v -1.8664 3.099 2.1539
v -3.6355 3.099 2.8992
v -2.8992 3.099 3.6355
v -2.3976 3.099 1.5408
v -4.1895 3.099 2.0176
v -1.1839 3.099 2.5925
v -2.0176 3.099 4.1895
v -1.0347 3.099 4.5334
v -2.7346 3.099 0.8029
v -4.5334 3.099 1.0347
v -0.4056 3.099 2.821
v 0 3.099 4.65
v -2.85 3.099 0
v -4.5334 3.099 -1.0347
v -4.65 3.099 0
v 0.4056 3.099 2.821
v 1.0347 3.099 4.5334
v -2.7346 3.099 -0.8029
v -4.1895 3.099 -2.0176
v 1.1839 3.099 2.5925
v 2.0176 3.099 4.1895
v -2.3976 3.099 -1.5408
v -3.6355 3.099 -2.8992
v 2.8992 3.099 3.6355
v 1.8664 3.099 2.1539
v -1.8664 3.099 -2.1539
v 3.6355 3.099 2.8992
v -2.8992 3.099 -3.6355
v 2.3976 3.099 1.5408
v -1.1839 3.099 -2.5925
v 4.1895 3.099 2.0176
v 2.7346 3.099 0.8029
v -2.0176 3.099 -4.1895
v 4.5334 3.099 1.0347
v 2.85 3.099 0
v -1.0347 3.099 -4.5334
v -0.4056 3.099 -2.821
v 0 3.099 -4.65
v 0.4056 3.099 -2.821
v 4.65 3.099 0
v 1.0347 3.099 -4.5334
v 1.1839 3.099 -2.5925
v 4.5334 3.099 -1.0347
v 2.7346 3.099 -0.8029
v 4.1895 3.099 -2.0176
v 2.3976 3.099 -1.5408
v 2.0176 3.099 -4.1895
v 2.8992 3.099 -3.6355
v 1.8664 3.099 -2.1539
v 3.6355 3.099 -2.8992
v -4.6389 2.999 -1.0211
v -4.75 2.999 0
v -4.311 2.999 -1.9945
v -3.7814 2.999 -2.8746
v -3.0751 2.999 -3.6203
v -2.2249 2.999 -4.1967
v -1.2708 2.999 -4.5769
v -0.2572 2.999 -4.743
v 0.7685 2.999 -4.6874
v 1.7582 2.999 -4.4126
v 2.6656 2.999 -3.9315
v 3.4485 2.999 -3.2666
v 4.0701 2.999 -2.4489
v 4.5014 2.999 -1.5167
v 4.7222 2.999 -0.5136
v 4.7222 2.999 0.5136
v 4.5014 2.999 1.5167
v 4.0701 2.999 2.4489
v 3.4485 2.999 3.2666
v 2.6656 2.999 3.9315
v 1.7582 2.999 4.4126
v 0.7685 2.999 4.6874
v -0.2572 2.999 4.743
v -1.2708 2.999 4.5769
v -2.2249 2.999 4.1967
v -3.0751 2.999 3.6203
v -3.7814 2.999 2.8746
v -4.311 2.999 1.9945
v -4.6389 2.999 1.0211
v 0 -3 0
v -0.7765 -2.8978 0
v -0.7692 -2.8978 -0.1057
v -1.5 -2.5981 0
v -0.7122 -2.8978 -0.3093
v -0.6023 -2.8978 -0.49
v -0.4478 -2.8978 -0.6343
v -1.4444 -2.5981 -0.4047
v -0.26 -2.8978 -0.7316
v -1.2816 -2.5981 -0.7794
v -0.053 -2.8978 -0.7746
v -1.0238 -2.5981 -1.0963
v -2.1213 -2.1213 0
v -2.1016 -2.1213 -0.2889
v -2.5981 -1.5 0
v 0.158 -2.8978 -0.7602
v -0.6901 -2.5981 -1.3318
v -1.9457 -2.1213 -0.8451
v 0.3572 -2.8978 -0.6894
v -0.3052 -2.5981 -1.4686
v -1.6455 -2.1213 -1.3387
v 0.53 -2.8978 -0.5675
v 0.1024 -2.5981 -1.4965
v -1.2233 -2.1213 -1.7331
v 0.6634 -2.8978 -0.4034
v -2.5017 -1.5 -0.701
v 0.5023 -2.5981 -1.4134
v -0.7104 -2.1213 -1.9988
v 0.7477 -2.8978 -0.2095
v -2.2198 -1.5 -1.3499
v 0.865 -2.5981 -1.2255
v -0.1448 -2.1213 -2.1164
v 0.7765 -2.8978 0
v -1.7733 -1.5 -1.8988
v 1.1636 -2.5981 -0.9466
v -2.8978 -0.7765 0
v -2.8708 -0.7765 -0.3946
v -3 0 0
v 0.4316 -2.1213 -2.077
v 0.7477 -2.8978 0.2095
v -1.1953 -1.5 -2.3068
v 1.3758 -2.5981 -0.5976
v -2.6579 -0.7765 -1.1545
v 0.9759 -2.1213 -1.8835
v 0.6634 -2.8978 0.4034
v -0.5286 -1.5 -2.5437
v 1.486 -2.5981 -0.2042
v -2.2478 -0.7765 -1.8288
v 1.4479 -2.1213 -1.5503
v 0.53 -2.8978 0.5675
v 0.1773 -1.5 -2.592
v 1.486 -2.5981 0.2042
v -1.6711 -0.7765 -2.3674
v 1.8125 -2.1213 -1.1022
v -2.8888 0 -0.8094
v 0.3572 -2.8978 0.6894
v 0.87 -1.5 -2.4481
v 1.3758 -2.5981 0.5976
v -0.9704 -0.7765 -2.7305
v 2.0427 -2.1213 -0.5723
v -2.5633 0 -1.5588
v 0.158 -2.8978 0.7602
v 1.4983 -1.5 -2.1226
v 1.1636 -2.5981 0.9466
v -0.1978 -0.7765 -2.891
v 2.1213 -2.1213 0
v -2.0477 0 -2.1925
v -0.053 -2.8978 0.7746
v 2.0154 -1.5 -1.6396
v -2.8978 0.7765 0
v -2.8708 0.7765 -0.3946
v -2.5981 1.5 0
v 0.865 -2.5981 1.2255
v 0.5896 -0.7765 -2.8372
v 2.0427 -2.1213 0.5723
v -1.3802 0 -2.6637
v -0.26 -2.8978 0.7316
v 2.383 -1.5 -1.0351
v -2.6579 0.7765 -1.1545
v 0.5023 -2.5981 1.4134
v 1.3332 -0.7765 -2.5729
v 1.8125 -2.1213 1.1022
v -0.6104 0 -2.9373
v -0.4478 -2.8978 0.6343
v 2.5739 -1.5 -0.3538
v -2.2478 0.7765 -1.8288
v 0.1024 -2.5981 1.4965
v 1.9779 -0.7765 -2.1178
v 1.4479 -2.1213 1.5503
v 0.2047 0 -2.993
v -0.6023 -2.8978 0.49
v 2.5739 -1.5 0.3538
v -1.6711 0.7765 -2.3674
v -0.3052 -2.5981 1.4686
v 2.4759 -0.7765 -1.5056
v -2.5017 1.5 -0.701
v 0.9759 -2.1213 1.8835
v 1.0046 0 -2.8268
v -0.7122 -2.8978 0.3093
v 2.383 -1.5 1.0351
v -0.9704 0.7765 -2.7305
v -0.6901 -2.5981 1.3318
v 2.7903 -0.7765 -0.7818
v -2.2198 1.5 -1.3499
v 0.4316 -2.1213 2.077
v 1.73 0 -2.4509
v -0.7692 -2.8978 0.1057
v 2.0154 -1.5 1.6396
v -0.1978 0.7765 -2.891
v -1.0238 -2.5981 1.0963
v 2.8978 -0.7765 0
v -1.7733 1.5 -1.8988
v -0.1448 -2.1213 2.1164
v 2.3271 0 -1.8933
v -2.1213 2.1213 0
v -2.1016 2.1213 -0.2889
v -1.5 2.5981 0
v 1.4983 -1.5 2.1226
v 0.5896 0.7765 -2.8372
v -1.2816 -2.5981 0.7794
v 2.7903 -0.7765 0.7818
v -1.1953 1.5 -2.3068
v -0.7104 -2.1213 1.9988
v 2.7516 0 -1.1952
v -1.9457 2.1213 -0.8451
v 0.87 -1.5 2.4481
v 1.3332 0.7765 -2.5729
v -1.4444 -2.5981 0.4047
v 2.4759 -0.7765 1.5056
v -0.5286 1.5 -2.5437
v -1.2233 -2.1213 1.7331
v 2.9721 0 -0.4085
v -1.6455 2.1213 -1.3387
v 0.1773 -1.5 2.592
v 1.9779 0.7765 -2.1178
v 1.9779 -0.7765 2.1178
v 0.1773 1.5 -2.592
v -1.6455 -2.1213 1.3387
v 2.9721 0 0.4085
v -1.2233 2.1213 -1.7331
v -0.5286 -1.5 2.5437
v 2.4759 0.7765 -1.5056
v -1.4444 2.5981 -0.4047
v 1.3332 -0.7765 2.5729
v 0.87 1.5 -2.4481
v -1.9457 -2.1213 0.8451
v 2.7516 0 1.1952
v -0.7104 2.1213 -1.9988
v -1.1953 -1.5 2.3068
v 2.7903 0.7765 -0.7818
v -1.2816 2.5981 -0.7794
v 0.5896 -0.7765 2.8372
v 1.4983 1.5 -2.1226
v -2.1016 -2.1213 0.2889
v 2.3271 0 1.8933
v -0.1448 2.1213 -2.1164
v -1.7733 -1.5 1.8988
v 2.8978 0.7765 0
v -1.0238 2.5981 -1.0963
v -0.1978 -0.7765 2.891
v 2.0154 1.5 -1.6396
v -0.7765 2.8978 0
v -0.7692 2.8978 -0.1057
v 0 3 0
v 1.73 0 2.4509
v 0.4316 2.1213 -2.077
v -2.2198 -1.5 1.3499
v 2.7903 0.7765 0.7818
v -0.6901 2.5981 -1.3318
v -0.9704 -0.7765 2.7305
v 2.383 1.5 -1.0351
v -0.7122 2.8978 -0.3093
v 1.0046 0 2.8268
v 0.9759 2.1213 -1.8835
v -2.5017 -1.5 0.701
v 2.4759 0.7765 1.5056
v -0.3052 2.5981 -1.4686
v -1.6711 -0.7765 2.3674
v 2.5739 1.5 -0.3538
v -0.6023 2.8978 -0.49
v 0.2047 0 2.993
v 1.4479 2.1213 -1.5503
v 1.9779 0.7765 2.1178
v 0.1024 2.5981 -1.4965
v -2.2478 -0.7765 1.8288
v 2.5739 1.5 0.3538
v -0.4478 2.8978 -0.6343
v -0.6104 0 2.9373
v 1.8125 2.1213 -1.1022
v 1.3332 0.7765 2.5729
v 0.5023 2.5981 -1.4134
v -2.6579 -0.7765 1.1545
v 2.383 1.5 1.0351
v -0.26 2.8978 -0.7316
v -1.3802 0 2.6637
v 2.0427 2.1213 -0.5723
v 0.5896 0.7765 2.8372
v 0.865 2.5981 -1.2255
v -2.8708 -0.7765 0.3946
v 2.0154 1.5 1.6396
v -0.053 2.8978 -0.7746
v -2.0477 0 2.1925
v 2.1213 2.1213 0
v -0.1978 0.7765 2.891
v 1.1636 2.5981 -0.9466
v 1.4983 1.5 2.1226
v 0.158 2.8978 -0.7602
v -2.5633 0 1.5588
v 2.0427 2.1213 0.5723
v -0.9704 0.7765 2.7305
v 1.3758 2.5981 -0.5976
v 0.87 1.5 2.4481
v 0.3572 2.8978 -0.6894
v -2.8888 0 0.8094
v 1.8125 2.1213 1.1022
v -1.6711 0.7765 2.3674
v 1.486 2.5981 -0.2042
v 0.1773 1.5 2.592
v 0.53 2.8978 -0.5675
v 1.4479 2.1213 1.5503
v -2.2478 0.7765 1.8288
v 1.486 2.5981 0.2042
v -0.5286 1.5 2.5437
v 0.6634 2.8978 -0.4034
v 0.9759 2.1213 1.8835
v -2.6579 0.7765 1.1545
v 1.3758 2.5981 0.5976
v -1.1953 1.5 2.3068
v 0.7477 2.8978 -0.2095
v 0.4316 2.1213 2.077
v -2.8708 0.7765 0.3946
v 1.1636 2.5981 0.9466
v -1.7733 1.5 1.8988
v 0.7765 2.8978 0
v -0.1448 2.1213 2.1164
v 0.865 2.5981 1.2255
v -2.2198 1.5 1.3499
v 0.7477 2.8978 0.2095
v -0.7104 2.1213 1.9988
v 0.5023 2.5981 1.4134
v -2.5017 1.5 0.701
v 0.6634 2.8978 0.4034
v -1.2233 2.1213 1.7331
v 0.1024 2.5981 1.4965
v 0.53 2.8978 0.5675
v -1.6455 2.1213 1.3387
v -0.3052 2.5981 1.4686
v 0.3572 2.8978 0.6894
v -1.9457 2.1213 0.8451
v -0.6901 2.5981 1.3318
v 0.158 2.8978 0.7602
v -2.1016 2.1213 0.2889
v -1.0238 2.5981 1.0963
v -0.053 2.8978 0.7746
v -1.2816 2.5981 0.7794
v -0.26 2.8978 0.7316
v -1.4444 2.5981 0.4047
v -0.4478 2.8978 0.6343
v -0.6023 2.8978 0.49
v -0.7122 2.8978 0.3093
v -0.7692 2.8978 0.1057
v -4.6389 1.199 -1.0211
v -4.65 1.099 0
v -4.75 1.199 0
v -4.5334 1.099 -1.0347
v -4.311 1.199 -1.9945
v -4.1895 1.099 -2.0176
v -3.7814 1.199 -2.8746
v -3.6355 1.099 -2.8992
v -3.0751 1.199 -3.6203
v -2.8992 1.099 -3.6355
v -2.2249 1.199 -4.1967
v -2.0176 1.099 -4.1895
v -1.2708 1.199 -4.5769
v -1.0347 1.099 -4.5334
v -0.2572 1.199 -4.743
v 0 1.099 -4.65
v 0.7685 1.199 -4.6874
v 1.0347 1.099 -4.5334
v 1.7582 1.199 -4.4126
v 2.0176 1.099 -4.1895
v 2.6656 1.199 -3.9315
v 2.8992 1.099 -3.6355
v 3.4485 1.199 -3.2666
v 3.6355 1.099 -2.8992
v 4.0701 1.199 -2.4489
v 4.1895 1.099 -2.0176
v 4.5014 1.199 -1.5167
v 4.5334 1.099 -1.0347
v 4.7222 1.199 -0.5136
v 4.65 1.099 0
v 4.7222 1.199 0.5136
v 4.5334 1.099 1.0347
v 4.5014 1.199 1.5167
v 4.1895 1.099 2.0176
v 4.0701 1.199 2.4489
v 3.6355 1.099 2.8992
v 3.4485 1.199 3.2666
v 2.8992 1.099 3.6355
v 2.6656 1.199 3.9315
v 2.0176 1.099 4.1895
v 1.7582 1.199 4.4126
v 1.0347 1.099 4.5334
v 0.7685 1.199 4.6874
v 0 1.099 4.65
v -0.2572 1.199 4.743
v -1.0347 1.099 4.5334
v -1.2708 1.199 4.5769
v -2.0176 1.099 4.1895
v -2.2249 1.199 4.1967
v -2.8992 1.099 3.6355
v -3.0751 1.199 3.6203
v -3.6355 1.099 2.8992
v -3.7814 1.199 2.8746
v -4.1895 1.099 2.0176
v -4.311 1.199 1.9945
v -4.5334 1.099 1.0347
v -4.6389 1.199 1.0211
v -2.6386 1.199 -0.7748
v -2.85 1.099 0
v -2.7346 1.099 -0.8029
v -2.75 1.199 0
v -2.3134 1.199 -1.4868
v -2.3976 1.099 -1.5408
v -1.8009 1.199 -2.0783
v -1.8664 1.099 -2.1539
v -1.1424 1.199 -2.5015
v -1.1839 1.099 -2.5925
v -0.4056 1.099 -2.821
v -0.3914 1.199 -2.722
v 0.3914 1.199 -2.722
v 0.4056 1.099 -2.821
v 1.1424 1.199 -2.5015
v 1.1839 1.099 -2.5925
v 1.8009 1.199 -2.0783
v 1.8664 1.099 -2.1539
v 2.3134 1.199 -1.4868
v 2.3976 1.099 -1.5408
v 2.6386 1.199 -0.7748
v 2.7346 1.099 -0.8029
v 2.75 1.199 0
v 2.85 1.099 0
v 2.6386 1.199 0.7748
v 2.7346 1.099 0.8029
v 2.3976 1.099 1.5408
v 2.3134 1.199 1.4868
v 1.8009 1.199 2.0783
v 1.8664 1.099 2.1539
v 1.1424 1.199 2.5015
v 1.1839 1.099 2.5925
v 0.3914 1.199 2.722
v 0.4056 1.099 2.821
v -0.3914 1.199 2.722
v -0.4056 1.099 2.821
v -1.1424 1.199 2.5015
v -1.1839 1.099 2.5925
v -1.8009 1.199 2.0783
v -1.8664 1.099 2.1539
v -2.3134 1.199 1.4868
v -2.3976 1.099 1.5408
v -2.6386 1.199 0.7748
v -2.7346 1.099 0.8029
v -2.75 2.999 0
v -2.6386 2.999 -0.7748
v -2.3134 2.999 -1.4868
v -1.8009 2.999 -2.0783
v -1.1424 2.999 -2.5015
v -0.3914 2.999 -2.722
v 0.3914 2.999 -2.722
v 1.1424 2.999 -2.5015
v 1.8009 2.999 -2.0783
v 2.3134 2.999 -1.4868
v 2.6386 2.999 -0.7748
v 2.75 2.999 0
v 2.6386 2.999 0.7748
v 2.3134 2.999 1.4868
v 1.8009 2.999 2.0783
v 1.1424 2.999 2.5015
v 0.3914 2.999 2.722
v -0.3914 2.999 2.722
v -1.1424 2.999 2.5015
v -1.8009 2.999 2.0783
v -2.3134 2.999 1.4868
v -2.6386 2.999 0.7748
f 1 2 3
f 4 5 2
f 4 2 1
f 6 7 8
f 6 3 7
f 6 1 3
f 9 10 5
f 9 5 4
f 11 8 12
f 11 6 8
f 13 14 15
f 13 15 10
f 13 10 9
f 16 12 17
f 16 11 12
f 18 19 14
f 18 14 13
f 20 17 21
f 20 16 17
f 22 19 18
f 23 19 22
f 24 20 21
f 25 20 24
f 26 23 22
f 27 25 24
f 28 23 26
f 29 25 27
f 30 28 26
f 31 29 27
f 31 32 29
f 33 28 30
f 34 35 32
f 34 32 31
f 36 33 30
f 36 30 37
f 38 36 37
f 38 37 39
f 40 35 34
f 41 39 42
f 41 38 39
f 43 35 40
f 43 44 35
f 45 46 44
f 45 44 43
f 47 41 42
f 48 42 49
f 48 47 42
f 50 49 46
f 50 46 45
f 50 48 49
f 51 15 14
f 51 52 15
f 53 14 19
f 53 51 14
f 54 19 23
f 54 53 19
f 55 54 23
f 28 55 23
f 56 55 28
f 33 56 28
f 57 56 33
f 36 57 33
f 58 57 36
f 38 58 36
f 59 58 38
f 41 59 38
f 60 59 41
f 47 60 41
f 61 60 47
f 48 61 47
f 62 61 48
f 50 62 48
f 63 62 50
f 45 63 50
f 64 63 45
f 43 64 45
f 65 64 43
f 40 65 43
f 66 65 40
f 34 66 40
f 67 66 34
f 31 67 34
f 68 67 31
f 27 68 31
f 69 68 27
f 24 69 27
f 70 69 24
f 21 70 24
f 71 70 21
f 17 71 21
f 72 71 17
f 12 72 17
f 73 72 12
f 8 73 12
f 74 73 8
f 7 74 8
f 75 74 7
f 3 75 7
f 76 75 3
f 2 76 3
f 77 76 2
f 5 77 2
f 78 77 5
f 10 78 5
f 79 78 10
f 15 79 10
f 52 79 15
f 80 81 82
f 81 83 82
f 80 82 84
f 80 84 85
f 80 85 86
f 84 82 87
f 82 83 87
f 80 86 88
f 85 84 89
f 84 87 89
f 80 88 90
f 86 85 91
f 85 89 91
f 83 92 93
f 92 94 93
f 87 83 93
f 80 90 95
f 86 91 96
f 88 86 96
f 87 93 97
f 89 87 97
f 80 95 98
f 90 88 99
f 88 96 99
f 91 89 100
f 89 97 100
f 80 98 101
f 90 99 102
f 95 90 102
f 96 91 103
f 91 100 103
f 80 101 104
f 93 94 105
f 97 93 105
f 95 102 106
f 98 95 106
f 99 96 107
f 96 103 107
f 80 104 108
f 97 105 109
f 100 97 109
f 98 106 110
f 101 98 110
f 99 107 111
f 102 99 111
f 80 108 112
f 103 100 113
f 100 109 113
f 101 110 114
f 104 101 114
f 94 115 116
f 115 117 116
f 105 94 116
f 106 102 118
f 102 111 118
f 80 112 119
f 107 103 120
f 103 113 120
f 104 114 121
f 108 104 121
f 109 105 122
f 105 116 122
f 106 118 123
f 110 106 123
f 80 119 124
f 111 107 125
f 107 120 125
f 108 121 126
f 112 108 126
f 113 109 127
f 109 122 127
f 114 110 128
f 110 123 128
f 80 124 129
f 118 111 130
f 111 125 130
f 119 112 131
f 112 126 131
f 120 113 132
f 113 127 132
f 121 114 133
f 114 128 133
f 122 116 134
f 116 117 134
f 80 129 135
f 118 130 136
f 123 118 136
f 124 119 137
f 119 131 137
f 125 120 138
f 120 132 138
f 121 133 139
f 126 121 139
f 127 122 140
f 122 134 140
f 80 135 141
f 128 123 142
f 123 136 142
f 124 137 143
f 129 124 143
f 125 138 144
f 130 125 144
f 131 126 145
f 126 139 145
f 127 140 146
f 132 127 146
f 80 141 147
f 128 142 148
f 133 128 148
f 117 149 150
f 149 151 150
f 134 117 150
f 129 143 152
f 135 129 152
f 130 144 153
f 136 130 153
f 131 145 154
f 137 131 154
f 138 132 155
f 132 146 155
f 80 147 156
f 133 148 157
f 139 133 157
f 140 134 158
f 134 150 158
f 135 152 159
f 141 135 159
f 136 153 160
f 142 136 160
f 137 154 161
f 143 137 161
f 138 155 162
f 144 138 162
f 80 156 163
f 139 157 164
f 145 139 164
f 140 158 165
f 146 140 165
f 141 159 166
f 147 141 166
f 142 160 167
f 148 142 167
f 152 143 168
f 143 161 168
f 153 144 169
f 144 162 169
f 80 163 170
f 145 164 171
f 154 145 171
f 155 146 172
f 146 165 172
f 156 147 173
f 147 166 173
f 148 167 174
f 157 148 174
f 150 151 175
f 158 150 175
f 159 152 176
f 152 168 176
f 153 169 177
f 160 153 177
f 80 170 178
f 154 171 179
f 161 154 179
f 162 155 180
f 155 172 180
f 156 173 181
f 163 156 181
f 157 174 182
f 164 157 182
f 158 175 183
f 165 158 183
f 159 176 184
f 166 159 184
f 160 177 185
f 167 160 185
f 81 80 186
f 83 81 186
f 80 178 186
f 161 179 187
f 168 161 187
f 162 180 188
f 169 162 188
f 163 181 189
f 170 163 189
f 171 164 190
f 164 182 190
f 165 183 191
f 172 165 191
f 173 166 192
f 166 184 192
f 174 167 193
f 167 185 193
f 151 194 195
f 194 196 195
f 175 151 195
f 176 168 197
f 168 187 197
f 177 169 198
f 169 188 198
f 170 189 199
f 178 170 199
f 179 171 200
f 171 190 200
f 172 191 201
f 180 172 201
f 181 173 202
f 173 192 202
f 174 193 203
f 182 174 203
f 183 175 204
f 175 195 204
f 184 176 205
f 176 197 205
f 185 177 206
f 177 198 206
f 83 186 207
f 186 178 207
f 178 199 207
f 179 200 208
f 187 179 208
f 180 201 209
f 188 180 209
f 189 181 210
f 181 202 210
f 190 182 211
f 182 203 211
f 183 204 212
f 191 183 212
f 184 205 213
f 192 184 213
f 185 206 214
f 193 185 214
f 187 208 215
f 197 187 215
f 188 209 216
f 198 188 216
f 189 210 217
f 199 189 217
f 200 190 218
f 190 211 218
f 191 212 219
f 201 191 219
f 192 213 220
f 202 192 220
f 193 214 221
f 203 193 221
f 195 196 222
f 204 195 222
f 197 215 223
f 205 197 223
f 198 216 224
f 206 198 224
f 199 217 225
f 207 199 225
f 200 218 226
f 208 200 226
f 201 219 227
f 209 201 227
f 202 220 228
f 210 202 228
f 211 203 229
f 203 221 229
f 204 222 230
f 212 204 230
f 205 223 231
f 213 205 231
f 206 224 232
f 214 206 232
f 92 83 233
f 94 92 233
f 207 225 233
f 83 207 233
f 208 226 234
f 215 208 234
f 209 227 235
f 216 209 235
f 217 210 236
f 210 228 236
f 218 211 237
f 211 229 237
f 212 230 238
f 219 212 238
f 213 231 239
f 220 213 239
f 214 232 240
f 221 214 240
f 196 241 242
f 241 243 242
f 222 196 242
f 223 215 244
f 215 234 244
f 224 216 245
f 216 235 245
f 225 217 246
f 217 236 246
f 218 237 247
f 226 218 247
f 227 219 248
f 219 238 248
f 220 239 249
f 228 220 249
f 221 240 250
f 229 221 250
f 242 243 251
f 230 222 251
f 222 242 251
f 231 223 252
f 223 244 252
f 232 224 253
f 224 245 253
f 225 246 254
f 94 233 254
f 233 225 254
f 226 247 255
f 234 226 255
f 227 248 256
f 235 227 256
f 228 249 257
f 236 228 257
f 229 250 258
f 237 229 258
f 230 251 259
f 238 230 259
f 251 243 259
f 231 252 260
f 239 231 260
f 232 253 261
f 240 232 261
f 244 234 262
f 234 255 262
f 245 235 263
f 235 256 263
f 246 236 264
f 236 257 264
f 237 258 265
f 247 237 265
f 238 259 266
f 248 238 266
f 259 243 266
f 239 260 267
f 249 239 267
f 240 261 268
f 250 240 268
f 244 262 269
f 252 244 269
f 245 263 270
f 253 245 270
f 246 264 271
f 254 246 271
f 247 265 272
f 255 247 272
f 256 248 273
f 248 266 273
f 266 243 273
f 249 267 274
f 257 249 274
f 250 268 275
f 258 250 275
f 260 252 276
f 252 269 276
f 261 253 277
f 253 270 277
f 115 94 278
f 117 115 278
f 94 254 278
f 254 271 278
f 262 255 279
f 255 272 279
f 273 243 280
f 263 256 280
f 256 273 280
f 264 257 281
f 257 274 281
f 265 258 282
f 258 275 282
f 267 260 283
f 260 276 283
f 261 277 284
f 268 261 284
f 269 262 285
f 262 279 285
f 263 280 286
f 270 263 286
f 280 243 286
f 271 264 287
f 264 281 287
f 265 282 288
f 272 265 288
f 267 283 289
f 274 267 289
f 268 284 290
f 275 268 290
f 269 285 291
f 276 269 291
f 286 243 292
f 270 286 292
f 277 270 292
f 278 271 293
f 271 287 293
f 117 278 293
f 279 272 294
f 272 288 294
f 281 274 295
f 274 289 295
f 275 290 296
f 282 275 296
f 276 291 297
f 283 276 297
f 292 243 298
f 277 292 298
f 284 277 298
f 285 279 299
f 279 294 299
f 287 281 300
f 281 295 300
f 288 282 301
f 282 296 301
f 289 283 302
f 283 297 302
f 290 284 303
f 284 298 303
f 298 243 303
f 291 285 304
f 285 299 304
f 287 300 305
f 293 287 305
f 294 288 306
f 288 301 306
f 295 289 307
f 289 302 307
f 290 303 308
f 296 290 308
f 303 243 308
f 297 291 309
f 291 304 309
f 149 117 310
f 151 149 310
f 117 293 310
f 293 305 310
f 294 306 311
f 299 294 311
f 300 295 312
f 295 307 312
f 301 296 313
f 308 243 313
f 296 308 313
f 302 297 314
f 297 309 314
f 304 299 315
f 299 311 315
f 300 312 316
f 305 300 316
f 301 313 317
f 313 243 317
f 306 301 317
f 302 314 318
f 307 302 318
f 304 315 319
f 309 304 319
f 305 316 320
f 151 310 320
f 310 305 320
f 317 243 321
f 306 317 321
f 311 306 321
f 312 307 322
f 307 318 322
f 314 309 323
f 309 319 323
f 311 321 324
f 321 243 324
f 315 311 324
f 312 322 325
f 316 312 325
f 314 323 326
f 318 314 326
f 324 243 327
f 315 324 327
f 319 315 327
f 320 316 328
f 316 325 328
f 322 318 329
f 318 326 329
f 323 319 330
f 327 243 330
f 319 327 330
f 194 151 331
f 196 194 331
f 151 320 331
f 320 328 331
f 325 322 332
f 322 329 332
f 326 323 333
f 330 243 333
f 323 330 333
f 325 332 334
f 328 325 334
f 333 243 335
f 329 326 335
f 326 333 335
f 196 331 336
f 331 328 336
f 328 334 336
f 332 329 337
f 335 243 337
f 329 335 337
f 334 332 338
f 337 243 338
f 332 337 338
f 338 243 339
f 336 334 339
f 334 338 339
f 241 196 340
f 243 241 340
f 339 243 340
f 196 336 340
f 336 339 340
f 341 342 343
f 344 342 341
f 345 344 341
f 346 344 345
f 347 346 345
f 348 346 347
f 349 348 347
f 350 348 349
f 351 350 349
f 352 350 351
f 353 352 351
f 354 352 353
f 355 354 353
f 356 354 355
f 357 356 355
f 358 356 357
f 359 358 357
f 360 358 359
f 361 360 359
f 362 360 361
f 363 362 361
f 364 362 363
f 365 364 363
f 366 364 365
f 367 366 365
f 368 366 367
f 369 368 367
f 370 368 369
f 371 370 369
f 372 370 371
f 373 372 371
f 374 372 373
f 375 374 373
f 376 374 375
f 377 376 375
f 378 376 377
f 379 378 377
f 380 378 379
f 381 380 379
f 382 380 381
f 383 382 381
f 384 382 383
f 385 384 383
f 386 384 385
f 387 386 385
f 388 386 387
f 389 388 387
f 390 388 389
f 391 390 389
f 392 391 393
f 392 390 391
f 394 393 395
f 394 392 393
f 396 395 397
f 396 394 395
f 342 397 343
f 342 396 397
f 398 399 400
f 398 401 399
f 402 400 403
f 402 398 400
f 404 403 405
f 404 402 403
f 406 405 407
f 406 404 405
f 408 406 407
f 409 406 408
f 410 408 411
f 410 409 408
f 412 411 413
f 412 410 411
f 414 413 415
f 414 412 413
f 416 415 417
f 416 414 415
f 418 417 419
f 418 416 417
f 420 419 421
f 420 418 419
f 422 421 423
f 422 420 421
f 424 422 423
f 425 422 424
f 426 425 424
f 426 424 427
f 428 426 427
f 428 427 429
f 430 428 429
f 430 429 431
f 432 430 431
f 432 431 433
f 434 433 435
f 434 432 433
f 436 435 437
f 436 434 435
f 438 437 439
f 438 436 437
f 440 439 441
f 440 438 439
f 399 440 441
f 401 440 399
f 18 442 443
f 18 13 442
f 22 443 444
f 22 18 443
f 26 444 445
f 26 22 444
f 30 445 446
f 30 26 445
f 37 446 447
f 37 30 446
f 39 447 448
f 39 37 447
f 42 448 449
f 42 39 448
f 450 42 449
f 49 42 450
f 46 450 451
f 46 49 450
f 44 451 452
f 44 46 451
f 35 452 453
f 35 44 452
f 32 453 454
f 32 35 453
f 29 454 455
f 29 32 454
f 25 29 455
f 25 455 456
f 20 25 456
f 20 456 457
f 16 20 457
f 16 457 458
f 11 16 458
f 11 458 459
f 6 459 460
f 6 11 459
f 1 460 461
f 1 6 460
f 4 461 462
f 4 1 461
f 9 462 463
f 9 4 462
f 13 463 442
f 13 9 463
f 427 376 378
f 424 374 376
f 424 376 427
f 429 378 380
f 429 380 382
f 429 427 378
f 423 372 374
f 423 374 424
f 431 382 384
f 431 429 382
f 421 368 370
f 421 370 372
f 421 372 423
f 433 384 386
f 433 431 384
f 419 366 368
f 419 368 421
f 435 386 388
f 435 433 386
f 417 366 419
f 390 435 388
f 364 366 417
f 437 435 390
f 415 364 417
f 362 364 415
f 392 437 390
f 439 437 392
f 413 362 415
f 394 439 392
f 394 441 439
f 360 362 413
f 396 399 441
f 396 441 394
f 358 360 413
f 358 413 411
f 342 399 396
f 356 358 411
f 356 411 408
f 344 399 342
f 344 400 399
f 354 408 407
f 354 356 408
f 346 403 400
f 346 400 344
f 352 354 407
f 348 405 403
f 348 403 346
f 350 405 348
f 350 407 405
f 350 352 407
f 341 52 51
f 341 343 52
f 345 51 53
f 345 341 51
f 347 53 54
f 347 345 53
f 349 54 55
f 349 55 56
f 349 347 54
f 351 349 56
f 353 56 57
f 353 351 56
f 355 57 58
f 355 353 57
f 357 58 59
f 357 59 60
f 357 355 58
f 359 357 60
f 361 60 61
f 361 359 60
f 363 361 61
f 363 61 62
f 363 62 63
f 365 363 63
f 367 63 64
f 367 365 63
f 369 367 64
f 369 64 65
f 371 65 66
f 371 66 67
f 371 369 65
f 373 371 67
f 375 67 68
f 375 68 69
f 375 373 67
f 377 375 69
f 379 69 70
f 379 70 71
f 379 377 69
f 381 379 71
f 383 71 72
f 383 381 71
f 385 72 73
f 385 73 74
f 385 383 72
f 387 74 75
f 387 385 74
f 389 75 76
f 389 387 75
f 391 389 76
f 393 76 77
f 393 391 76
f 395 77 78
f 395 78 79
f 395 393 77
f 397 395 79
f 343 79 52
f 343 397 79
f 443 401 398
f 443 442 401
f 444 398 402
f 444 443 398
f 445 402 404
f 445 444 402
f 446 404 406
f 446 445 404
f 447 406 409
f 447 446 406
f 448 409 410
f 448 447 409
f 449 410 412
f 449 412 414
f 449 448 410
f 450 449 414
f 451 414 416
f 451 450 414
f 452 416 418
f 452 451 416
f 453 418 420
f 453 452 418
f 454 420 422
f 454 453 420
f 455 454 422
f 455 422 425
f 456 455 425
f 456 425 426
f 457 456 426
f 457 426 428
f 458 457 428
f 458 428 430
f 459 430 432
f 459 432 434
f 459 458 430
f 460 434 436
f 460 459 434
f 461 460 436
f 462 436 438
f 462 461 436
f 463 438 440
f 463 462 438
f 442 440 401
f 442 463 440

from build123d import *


with BuildPart() as part:
    # Croquis1 → Revolución1 (revolve)
    with BuildSketch(Plane.XY):
        Polygon((-2.85, 1.098957881), (-2.75, 1.198957881), (-2.75, 2.998957881), (-2.85, 3.098957881), (-4.65, 3.098957881), (-4.75, 2.998957881), (-4.75, 1.198957881), (-4.65, 1.098957881), align=None)
    revolve(axis=Axis((0, 3, 0), (0, -1, 0)))


with BuildPart() as body_2:
    # Croquis2 → Revolución2 (revolve)
    with BuildSketch(Plane.XY):
        with BuildLine():
            Line((0, 3), (0, -3))
            ThreePointArc((0, -3), (-3, 0), (0, 3))
        make_face()
    revolve(axis=Axis((0, 3, 0), (0, -1, 0)))


solid = Compound([part.part, body_2.part])
